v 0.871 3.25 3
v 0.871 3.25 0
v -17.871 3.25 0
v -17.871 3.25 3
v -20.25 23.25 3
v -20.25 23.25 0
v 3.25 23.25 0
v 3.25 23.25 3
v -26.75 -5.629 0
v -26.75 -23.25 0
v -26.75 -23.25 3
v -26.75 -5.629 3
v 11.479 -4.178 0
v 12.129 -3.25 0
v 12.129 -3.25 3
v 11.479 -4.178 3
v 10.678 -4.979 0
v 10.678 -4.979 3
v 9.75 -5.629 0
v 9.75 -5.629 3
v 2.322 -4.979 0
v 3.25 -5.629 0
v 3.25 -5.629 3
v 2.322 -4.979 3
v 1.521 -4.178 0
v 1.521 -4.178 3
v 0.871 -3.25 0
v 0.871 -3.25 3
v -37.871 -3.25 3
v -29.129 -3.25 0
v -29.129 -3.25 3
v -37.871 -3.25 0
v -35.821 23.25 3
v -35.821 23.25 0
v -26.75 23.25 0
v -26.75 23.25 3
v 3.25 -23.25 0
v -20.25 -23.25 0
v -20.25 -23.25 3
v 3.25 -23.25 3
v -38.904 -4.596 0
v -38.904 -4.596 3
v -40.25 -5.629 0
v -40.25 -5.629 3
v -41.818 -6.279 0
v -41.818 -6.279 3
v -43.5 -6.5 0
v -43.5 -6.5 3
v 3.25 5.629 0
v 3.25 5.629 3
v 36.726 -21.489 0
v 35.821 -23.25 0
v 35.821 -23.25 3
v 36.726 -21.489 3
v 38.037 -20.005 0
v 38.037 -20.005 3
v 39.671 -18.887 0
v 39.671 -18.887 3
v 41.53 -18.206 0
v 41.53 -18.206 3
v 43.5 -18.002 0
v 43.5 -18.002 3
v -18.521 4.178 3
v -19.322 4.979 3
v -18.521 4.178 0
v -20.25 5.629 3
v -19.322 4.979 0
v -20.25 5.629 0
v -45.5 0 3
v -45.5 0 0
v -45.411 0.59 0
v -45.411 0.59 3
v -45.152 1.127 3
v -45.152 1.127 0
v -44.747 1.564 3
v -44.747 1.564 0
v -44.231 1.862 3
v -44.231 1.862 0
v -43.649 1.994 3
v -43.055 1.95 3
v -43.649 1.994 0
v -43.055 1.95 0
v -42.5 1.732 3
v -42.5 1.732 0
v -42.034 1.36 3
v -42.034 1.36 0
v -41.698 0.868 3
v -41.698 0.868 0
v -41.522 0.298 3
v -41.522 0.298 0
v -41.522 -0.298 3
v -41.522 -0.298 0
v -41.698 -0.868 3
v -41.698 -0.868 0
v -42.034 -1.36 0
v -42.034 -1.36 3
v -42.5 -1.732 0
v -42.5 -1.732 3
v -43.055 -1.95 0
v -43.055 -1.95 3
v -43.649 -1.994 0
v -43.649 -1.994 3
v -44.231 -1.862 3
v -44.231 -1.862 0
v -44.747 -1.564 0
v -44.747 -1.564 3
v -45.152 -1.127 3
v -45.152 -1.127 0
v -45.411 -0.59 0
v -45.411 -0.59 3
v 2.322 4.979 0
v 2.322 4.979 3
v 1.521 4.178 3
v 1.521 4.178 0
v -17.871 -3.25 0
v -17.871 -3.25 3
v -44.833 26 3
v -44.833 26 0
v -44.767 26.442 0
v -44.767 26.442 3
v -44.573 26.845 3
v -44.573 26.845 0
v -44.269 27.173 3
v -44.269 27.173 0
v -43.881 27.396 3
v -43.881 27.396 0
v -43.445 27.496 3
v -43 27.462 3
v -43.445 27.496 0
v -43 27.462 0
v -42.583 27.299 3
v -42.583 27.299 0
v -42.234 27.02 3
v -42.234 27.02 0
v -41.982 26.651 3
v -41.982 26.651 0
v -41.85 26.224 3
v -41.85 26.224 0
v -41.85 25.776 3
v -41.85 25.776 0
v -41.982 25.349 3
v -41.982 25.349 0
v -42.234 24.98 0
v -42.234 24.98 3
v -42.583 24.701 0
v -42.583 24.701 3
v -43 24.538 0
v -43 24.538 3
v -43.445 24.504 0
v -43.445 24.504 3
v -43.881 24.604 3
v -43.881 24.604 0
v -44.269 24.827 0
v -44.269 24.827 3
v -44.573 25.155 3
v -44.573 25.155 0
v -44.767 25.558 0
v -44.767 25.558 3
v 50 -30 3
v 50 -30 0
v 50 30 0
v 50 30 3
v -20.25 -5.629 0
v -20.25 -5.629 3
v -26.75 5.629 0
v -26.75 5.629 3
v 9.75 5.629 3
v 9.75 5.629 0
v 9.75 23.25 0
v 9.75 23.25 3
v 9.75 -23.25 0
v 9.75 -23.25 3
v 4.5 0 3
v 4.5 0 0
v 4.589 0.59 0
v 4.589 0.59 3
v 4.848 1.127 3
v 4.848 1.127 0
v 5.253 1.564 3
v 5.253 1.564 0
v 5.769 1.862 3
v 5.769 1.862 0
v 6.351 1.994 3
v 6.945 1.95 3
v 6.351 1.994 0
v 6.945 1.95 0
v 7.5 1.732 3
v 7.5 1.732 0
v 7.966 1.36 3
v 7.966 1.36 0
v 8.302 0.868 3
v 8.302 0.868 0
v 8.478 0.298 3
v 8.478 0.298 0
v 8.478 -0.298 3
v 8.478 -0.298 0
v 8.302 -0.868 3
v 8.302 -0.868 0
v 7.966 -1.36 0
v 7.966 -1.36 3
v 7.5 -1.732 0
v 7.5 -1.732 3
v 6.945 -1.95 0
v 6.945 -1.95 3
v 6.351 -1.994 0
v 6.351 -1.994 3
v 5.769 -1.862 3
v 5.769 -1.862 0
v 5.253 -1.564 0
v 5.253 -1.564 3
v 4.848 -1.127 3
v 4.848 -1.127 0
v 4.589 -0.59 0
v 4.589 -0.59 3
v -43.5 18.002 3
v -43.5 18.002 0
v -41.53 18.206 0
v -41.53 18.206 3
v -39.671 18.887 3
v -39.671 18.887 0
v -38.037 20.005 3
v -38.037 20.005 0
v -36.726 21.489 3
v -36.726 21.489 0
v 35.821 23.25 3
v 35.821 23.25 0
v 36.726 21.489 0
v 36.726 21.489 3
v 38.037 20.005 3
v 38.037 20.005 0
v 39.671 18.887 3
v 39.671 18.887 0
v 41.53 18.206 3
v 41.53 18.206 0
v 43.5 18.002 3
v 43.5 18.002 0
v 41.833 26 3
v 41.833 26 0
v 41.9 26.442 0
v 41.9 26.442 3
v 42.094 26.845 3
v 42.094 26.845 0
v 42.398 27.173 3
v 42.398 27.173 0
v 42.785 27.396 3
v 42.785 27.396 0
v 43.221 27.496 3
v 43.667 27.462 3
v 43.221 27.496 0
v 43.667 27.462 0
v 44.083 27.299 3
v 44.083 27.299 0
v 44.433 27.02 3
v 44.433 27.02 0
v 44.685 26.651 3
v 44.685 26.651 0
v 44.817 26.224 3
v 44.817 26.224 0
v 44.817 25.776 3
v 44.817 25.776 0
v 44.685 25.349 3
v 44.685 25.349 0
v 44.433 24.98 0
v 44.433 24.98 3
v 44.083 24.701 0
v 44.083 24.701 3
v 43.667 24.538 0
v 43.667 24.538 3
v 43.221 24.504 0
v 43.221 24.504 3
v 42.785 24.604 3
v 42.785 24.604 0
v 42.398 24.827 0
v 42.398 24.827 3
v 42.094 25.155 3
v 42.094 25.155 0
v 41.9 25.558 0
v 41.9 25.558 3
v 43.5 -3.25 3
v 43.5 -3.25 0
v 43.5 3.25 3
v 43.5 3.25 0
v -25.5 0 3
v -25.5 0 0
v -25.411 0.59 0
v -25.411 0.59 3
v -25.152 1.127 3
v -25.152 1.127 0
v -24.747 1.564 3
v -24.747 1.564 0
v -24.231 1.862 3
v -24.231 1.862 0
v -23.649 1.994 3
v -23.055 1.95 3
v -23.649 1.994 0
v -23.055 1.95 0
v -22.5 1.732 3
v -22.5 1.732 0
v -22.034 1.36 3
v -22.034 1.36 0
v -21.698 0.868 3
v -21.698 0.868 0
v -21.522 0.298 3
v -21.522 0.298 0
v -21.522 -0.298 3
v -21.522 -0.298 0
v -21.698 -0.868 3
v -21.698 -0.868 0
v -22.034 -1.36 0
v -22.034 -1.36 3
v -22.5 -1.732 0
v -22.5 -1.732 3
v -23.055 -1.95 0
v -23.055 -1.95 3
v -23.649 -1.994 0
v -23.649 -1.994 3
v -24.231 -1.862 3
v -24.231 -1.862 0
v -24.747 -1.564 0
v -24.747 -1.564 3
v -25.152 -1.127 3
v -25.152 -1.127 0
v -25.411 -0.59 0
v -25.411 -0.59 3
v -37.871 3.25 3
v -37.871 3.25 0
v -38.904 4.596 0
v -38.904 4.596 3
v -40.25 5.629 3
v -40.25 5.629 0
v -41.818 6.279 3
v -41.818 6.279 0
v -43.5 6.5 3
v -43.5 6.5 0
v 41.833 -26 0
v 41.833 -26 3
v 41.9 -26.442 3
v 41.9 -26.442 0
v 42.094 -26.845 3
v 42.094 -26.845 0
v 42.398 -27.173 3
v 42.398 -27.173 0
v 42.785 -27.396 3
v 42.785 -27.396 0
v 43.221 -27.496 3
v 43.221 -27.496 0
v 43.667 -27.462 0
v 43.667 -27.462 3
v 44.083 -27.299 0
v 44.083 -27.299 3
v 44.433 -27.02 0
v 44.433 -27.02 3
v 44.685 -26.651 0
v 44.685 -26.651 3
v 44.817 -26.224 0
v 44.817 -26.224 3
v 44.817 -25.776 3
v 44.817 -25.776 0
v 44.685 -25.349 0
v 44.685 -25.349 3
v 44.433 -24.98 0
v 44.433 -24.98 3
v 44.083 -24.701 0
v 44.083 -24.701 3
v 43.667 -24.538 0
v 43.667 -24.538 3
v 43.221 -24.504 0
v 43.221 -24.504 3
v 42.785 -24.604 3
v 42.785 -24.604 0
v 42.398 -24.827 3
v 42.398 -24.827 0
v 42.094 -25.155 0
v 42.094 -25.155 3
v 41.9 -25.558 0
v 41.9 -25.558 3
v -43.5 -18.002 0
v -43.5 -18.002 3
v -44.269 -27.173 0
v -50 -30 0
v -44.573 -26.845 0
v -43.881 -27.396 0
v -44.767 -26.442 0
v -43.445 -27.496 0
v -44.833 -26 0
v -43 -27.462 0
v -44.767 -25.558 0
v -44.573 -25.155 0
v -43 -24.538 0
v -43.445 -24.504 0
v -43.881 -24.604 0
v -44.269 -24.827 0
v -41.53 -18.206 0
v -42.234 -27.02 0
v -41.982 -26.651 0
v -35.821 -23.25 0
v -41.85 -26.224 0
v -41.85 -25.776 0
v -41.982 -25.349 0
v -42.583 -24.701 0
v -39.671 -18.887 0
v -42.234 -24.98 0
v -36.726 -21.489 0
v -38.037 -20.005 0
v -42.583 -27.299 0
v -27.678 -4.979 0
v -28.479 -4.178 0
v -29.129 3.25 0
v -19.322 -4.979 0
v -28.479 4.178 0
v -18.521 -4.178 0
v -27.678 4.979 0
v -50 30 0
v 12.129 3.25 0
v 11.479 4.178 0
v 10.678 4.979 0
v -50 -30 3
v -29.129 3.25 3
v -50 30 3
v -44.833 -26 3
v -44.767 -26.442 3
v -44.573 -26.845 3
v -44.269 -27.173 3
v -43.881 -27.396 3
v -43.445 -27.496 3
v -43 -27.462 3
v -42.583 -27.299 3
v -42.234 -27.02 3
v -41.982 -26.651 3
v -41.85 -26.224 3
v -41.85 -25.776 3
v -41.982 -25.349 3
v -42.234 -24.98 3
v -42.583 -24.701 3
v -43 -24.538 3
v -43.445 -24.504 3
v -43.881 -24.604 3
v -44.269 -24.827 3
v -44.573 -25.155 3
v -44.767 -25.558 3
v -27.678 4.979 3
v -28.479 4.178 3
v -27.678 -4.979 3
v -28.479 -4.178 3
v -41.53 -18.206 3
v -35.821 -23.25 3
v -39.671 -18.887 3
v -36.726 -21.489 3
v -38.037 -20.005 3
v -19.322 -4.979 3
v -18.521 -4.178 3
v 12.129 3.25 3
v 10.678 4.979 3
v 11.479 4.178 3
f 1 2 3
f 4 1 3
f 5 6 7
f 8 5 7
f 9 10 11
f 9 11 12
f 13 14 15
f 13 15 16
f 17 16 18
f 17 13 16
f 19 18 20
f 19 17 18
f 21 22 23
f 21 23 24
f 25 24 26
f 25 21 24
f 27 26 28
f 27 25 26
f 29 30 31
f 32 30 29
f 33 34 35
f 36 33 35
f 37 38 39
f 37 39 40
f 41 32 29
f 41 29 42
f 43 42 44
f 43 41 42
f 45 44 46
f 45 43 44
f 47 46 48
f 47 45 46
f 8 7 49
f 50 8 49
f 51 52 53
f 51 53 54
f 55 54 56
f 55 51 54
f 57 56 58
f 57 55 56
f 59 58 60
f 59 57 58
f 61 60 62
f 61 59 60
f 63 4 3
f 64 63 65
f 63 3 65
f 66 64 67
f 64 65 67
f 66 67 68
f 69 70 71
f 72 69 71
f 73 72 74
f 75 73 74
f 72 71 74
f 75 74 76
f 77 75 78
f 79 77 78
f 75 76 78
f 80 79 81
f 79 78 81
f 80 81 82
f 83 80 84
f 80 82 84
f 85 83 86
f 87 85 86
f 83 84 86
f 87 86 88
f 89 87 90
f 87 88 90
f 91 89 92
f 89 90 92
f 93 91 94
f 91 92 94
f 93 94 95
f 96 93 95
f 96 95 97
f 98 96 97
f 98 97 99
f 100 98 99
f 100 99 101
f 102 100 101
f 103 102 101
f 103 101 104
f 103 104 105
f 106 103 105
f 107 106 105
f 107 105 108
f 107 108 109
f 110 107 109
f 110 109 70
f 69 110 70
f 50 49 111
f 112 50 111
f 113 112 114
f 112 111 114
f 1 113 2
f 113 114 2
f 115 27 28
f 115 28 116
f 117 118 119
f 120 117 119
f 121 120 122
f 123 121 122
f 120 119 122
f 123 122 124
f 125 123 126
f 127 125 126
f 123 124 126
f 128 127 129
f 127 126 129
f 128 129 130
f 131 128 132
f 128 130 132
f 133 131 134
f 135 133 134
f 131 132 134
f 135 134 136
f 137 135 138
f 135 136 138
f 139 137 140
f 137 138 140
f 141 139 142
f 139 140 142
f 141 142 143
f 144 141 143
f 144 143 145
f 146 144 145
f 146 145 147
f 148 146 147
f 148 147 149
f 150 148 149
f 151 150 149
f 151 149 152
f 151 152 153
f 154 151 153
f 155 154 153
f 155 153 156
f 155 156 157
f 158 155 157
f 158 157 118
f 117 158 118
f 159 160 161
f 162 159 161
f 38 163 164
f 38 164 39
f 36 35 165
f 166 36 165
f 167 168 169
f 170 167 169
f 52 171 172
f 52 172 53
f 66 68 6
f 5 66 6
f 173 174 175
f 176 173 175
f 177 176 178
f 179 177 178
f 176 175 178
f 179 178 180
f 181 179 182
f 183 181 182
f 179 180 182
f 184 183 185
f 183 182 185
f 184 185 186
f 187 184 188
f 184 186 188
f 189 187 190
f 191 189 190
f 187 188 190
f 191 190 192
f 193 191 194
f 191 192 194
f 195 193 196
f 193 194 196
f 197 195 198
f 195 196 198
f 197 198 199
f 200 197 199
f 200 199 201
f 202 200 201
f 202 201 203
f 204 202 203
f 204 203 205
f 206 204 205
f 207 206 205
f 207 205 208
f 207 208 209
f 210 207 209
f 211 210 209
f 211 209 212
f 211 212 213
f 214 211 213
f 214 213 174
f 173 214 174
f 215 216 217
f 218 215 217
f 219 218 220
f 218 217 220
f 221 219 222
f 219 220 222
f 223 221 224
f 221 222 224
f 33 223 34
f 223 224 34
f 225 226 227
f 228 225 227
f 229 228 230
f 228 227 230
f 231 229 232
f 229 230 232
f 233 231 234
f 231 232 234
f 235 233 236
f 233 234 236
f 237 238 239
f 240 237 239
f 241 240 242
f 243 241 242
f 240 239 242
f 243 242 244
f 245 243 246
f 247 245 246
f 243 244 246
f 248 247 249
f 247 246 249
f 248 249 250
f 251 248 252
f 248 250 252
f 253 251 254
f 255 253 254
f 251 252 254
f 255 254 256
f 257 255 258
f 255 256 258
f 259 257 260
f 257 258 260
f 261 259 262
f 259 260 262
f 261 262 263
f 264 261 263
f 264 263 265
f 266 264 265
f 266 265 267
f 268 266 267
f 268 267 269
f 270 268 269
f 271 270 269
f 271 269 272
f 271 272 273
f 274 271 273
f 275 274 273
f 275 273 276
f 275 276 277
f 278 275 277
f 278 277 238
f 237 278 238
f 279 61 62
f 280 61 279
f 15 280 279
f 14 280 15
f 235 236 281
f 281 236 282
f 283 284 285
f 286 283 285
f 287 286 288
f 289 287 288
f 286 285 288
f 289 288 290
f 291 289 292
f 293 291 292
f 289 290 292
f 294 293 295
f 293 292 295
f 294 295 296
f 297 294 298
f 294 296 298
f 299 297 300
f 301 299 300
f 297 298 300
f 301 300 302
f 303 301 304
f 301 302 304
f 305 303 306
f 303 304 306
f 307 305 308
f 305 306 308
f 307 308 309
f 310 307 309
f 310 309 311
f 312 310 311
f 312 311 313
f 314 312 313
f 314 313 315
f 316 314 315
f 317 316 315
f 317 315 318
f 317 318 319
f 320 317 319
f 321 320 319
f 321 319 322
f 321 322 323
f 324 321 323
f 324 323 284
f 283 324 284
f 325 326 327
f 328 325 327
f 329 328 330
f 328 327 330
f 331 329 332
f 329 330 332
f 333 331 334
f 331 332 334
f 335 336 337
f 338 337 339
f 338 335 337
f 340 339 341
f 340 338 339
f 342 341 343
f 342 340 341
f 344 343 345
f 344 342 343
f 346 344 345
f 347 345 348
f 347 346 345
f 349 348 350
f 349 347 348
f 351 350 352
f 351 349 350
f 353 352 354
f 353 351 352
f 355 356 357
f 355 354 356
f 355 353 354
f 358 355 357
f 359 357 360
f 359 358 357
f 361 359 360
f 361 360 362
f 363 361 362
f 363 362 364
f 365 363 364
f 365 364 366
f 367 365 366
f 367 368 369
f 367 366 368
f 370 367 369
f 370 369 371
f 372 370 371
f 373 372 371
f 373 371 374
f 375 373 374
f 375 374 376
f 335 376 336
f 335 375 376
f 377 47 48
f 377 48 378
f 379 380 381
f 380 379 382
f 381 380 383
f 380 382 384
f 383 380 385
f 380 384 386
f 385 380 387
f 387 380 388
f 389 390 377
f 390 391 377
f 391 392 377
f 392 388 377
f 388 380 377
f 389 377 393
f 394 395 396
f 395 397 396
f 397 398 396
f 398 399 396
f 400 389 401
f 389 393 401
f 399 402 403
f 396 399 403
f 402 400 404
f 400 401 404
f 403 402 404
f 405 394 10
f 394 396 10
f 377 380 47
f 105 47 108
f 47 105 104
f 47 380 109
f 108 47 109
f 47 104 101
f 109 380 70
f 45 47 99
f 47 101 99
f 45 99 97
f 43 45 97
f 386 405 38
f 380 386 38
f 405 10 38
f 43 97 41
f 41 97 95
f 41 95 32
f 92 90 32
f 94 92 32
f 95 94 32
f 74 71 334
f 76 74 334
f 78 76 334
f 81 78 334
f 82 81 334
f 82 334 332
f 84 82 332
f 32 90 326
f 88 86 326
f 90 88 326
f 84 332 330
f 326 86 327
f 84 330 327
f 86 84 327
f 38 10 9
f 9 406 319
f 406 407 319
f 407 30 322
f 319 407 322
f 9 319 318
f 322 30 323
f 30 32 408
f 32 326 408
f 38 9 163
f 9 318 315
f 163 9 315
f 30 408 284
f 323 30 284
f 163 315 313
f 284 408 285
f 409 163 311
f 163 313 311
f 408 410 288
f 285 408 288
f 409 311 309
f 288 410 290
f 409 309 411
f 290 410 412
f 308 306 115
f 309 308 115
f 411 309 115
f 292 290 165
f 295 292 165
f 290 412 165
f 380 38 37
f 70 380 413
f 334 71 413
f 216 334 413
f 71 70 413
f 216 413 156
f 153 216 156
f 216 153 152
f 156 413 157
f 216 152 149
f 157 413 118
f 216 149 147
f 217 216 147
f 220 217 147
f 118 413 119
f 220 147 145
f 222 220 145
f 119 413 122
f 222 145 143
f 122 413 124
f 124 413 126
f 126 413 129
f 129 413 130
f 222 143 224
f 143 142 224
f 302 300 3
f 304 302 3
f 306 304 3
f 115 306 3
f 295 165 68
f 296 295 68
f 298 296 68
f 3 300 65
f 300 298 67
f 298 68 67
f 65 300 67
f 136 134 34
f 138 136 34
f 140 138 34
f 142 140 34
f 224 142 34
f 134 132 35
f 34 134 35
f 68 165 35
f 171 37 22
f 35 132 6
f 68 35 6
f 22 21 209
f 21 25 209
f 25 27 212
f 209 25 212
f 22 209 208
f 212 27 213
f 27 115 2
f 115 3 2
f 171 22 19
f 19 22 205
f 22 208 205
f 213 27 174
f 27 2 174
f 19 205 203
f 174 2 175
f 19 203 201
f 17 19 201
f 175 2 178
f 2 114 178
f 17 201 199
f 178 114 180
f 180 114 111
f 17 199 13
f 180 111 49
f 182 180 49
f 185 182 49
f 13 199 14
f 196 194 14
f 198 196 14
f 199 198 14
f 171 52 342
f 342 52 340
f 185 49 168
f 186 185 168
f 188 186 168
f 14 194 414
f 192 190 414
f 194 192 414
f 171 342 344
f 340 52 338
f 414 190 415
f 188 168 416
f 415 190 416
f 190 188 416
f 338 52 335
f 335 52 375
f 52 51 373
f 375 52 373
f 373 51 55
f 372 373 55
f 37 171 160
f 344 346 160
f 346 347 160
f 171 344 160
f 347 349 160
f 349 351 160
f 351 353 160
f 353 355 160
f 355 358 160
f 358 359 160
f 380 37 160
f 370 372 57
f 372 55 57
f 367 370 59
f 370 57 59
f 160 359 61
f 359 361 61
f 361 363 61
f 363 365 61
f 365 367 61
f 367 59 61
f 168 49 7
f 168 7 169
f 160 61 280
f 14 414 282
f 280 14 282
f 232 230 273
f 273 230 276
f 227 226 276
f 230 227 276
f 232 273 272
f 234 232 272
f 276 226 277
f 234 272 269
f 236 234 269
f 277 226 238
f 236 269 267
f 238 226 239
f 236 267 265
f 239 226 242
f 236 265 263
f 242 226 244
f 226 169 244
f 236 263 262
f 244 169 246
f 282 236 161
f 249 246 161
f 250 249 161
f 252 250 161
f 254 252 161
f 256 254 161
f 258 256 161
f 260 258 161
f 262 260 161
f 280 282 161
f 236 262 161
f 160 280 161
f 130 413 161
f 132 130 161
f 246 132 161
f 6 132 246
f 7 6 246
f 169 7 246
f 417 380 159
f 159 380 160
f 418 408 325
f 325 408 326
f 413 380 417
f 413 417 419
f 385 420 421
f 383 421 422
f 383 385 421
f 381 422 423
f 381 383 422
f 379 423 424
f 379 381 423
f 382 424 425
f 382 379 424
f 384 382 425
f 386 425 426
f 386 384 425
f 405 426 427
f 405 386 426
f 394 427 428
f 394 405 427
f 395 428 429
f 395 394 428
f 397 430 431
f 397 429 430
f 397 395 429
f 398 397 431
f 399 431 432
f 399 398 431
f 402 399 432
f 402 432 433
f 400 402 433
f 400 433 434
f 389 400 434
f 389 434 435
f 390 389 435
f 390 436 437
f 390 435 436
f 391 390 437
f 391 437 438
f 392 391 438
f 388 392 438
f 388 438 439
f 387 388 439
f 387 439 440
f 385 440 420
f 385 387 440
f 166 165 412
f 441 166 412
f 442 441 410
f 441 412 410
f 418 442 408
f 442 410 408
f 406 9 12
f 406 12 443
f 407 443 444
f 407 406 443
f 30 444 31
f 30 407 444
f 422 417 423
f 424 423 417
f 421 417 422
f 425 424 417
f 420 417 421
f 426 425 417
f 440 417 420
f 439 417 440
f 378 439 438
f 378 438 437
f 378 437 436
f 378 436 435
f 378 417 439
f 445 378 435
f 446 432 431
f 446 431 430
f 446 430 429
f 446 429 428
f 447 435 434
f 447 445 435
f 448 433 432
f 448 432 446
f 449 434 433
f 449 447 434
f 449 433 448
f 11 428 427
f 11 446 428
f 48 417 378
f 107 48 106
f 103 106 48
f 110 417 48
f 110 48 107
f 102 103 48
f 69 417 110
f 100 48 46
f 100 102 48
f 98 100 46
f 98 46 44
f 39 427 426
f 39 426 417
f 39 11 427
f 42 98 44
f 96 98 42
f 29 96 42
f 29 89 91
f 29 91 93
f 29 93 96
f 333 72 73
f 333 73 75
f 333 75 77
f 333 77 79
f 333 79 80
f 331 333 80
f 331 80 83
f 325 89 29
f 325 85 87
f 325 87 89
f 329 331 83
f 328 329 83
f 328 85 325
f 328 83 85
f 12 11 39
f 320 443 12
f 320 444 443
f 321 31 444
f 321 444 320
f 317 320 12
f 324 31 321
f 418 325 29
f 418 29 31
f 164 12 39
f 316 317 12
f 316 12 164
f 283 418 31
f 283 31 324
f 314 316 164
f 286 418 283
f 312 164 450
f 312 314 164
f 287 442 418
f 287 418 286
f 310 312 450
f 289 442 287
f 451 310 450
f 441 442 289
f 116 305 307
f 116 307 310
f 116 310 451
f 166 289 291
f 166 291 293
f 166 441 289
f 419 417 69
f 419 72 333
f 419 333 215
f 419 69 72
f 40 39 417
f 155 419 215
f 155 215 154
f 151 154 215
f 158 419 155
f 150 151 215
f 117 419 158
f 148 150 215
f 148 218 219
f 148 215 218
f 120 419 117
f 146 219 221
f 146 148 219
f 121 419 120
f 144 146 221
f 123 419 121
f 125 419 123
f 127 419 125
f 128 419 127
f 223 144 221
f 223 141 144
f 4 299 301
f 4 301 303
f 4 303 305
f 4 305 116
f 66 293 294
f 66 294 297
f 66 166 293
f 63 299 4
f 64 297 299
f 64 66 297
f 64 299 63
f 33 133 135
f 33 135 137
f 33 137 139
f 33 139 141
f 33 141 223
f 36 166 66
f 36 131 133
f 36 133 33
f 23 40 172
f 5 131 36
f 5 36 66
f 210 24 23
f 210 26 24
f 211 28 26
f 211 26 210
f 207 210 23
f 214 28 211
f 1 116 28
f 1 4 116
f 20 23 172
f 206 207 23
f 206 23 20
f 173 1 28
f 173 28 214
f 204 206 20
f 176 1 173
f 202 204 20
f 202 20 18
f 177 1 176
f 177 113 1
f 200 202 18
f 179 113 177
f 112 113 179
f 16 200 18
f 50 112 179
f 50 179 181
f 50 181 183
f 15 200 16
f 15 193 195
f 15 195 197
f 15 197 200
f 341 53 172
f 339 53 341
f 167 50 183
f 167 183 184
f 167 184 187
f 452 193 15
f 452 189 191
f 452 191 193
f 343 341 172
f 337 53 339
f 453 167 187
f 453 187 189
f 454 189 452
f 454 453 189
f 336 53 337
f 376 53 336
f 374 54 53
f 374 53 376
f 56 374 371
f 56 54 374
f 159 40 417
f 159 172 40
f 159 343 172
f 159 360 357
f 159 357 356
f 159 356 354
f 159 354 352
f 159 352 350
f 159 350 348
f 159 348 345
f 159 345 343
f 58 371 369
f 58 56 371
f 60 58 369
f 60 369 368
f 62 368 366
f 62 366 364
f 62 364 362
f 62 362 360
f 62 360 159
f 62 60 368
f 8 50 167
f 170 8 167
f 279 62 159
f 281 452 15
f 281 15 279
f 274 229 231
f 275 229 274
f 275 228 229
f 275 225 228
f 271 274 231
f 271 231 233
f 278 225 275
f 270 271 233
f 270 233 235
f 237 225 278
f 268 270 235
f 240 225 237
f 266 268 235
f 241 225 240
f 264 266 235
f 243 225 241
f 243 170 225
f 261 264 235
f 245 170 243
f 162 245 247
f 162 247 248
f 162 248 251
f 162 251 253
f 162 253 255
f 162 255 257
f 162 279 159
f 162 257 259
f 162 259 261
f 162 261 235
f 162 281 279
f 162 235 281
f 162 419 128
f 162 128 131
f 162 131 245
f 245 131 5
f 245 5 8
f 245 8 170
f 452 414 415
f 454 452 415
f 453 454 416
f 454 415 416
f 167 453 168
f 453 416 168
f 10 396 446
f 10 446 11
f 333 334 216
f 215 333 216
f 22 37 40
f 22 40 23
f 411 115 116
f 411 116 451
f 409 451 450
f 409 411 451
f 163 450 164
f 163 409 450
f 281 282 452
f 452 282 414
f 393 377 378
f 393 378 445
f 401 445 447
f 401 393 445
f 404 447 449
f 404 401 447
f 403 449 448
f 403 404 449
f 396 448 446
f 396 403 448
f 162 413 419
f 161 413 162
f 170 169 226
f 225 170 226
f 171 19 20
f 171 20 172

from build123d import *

# Parameters (mm, degrees)
SKETCH1_W           = 100
SKETCH1_H           = 60
BOSS_EXTRUDE1_DEPTH = 3
SKETCH3_R           = 1.5
SKETCH3_R_2         = 2
CUT_EXTRUDE2_DEPTH  = 10


with BuildPart() as part:
    # Sketch1 → Boss-Extrude1 (new body)
    with BuildSketch(Plane.XY):
        Rectangle(SKETCH1_W, SKETCH1_H)
    extrude(amount=BOSS_EXTRUDE1_DEPTH)

    # Sketch3 → Cut-Extrude2 (cut)
    with BuildSketch(Plane(origin=(0, 0, 0), x_dir=(-1, 0, 0), z_dir=(0, 0, -1))):
        with Locations((43.333333333, 26)):
            Circle(SKETCH3_R)
        with Locations((-43.333333333, 26)):
            Circle(SKETCH3_R)
        with Locations((23.5, 0)):
            Circle(SKETCH3_R_2)
        with Locations((-6.5, 0)):
            Circle(SKETCH3_R_2)
        with Locations((43.5, 0)):
            Circle(SKETCH3_R_2)
        with BuildLine():
            Line((29.129165125, 3.25), (37.870834875, 3.25))
            ThreePointArc((37.870834875, 3.25), (40.25, 5.629165125), (43.5, 6.5))
            Line((43.5, 6.5), (43.5, 18.0017363))
            ThreePointArc((43.5, 18.0017363), (38.819316651, 19.395179534), (35.820843733, 23.25))
            Line((35.820843733, 23.25), (26.75, 23.25))
            Line((26.75, 23.25), (26.75, 5.629165125))
            ThreePointArc((26.75, 5.629165125), (28.096194078, 4.596194078), (29.129165125, 3.25))
        make_face()
        with BuildLine():
            Line((-9.75, 23.25), (-35.820843733, 23.25))
            ThreePointArc((-35.820843733, 23.25), (-38.819316651, 19.395179534), (-43.5, 18.0017363))
            Line((-43.5, 18.0017363), (-43.5, 3.25))
            Line((-43.5, 3.25), (-12.129165125, 3.25))
            ThreePointArc((-12.129165125, 3.25), (-11.096194078, 4.596194078), (-9.75, 5.629165125))
            Line((-9.75, 5.629165125), (-9.75, 23.25))
        make_face()
        with BuildLine():
            Line((-0.870834875, 3.25), (17.870834875, 3.25))
            ThreePointArc((17.870834875, 3.25), (18.903805922, 4.596194078), (20.25, 5.629165125))
            Line((20.25, 5.629165125), (20.25, 23.25))
            Line((20.25, 23.25), (-3.25, 23.25))
            Line((-3.25, 23.25), (-3.25, 5.629165125))
            ThreePointArc((-3.25, 5.629165125), (-1.903805922, 4.596194078), (-0.870834875, 3.25))
        make_face()
    cut_extrude2 = extrude(amount=-CUT_EXTRUDE2_DEPTH, mode=Mode.SUBTRACT)

    # Mirror3: Cut-Extrude2 across plane
    add(cut_extrude2.mirror(Plane.ZX), mode=Mode.SUBTRACT)


solid = part.part
